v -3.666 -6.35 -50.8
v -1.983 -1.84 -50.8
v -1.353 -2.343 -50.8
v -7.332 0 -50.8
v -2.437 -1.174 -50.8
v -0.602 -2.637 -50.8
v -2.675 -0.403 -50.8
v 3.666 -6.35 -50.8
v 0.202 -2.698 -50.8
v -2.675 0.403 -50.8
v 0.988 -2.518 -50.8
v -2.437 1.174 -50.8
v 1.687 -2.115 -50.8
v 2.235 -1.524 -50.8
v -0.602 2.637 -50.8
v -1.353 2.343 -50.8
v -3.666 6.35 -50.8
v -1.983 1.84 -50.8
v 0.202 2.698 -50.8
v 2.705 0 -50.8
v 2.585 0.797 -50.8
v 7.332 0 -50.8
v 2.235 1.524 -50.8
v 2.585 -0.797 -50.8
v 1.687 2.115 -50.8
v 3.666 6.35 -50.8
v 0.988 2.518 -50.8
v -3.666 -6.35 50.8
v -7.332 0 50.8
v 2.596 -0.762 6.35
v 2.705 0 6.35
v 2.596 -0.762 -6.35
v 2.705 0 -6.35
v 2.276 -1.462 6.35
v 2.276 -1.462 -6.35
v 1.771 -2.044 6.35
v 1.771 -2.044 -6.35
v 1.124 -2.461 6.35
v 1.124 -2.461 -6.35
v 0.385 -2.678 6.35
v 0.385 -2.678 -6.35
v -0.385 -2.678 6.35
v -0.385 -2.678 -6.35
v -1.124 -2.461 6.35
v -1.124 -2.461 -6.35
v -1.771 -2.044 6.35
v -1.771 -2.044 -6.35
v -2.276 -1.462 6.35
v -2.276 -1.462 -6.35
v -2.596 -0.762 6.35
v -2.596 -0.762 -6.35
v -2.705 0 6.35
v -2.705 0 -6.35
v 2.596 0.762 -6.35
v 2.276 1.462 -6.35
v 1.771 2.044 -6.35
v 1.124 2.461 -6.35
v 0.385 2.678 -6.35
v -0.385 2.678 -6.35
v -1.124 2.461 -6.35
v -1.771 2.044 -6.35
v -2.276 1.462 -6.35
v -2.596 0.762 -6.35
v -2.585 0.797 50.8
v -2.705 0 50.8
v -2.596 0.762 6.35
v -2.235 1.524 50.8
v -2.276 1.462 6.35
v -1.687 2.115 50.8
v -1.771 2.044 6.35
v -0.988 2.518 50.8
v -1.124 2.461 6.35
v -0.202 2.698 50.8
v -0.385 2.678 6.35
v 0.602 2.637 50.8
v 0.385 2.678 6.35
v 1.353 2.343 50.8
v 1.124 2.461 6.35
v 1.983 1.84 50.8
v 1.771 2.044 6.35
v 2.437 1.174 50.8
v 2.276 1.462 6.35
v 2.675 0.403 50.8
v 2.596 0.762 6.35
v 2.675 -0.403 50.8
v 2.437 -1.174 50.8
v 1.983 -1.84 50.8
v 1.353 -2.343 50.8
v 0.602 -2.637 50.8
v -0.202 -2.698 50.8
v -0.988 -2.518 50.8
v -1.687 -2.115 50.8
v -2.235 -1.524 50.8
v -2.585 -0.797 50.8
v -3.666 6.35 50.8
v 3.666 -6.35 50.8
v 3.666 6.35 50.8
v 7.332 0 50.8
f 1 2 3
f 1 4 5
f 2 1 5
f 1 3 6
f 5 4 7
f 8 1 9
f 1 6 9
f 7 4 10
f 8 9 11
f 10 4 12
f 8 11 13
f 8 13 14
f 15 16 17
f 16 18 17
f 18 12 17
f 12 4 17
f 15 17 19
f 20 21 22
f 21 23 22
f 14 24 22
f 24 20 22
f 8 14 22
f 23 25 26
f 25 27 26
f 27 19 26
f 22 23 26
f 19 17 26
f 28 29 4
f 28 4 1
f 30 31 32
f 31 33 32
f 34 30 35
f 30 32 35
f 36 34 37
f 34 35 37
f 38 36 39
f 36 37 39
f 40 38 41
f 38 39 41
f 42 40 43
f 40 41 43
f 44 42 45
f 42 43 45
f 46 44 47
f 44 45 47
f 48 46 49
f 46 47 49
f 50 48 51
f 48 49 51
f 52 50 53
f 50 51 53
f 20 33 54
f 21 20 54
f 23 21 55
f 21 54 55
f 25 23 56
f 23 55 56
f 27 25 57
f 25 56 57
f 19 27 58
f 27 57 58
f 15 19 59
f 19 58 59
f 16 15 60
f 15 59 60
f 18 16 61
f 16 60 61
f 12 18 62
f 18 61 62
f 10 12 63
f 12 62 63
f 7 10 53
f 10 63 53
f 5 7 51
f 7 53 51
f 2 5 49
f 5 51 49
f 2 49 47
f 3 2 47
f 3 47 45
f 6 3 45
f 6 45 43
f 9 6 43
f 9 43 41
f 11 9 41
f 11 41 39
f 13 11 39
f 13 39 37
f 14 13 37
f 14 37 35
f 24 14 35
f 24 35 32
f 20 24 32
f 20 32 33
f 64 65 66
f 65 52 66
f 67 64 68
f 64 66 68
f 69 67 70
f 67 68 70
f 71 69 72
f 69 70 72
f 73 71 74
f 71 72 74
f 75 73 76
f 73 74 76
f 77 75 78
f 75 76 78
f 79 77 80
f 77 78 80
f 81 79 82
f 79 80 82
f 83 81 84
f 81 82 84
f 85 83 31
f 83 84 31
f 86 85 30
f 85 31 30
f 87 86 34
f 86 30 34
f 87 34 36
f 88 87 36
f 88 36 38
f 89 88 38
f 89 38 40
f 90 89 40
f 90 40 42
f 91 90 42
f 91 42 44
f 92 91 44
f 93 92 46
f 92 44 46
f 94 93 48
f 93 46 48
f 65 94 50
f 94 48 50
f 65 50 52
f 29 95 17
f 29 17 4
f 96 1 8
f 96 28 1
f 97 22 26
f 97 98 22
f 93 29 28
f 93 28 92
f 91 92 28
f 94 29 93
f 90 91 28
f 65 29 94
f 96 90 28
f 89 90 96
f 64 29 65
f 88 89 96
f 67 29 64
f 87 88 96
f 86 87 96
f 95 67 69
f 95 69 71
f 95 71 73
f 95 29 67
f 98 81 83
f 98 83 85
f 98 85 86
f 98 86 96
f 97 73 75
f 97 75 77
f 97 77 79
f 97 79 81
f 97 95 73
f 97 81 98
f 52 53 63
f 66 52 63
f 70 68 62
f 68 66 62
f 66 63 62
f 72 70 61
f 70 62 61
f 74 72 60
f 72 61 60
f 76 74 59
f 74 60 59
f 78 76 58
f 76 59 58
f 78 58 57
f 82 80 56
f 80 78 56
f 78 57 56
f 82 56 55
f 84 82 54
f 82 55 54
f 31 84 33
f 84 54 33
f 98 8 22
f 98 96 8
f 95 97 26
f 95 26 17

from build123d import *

# Parameters (mm, degrees)
BOSS_EXTRUDE1_DEPTH         = 50.8
F_1_4_28_TAPPED_HOLE1_D     = 5.4102
F_1_4_28_TAPPED_HOLE1_DEPTH = 57.15
F_1_4_28_TAPPED_HOLE1_TIP   = 1.625388061
F_1_4_28_TAPPED_HOLE2_D     = 5.4102
F_1_4_28_TAPPED_HOLE2_DEPTH = 57.15
F_1_4_28_TAPPED_HOLE2_TIP   = 1.625388061


with BuildPart() as part:
    # Sketch1 → Boss-Extrude1 (new, symmetric)
    with BuildSketch(Plane.XY):
        Polygon((7.332348419, 0), (3.666174209, 6.35), (-3.666174209, 6.35), (-7.332348419, 0), (-3.666174209, -6.35), (3.666174209, -6.35), align=None)
    extrude(amount=BOSS_EXTRUDE1_DEPTH, both=True)

    # 1/4-28 Tapped Hole1
    with Locations(Plane.XY.offset(50.8)):
        with Locations((0, 0)):
            Hole(F_1_4_28_TAPPED_HOLE1_D / 2, depth=F_1_4_28_TAPPED_HOLE1_DEPTH)
            with Locations((0, 0, -(F_1_4_28_TAPPED_HOLE1_DEPTH + F_1_4_28_TAPPED_HOLE1_TIP / 2))):  # 118° drill point
                Cone(0, F_1_4_28_TAPPED_HOLE1_D / 2, F_1_4_28_TAPPED_HOLE1_TIP, mode=Mode.SUBTRACT)

    # 1/4-28 Tapped Hole2
    with Locations(Plane(origin=(0, 0, -50.8), x_dir=(-1, 0, 0), z_dir=(0, 0, -1))):
        with Locations((0, 0)):
            Hole(F_1_4_28_TAPPED_HOLE2_D / 2, depth=F_1_4_28_TAPPED_HOLE2_DEPTH)
            with Locations((0, 0, -(F_1_4_28_TAPPED_HOLE2_DEPTH + F_1_4_28_TAPPED_HOLE2_TIP / 2))):  # 118° drill point
                Cone(0, F_1_4_28_TAPPED_HOLE2_D / 2, F_1_4_28_TAPPED_HOLE2_TIP, mode=Mode.SUBTRACT)


solid = part.part
